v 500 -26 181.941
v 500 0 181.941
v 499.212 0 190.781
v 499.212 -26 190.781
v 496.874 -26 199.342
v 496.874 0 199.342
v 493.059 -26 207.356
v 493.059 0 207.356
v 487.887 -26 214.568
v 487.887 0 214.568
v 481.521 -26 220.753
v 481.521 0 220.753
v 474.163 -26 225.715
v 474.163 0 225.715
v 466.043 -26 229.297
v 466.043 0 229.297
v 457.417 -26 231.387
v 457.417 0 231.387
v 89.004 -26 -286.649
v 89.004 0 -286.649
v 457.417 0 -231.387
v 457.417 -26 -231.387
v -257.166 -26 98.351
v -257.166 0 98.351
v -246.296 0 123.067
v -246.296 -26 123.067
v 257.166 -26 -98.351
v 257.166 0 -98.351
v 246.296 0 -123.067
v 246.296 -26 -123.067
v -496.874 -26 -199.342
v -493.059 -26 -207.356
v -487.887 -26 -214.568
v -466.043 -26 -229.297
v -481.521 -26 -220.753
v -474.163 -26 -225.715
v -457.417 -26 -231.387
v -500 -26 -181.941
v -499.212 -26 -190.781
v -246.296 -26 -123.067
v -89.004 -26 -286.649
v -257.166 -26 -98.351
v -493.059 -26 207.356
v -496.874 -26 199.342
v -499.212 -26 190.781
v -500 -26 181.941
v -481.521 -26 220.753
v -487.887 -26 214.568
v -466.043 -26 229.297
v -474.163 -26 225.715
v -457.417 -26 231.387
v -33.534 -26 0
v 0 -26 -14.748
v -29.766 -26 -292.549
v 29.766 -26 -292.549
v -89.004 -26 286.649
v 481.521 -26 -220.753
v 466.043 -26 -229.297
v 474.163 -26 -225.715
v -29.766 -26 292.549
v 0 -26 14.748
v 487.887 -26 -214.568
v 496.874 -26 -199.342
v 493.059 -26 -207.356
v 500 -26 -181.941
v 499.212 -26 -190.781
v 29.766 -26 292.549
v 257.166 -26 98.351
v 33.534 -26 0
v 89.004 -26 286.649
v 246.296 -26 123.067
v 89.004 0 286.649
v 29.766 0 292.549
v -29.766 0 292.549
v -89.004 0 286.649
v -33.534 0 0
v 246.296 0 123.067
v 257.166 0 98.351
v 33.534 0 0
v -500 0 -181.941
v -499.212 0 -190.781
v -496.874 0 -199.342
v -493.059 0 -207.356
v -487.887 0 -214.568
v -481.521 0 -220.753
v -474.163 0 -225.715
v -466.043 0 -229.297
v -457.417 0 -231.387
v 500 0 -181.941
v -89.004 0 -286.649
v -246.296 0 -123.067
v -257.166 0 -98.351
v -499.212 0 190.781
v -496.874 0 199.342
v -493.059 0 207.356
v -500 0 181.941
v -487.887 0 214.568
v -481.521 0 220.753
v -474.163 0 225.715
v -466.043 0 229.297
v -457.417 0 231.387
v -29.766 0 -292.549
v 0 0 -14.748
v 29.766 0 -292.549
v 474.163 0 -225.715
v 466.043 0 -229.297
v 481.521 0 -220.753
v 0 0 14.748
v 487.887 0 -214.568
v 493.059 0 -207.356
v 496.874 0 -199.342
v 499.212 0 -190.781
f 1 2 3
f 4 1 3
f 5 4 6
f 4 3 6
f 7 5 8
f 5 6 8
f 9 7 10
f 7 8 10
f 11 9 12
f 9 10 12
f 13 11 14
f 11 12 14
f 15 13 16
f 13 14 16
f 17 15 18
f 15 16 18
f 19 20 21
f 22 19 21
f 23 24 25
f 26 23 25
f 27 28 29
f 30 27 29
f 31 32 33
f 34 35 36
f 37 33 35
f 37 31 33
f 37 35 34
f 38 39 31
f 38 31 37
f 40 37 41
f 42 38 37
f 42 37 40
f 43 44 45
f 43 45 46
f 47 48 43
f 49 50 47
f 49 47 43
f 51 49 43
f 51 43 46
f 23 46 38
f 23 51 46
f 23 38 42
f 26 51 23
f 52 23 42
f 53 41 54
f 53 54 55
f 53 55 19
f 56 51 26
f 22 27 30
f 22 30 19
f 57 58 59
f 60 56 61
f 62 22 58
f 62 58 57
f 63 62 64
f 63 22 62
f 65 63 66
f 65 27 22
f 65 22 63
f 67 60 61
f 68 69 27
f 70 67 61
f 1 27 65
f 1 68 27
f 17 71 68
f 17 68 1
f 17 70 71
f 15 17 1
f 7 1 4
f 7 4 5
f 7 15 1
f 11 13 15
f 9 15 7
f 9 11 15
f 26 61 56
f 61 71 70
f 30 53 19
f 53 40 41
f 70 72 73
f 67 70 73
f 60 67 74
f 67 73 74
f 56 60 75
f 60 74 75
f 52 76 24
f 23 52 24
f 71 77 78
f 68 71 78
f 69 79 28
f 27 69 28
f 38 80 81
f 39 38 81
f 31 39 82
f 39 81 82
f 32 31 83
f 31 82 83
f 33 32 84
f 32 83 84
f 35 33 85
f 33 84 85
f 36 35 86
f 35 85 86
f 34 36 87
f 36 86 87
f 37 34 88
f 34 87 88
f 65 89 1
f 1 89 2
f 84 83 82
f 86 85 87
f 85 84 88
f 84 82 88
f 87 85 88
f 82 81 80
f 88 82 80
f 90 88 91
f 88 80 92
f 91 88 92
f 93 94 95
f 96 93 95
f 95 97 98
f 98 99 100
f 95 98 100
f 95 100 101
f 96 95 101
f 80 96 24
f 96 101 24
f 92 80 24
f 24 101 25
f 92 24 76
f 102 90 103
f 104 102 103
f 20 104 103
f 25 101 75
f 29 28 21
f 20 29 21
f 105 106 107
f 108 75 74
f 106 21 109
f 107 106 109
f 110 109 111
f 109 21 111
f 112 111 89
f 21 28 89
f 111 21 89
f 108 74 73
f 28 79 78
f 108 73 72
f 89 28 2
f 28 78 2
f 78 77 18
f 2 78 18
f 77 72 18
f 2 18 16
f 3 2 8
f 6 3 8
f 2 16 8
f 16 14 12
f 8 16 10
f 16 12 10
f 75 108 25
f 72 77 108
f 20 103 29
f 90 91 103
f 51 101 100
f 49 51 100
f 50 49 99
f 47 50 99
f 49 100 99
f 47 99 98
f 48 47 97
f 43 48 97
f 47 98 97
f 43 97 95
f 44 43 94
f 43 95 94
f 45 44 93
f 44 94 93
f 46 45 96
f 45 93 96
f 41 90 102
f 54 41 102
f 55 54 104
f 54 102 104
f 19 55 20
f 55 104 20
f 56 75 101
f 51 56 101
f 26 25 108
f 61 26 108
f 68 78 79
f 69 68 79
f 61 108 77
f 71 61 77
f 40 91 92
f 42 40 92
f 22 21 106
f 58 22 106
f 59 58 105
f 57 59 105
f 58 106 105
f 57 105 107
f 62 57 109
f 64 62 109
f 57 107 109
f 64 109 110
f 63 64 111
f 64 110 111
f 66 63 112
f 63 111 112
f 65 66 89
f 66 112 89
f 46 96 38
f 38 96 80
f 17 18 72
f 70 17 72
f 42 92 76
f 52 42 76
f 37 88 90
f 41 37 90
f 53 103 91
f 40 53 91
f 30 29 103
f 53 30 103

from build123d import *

# Parameters (mm, degrees)
F1_DEPTH = 26


with BuildPart() as f1:
    # F0 (on Front) → F1 (new body)
    with BuildSketch(Plane.XZ):
        with BuildLine():
            Line((-500, 181.940629), (-500, -181.940629))
            ThreePointArc((-500, -181.940629), (-487.887011, -214.568446), (-457.417023, -231.387447))
            Line((-457.417023, -231.387447), (-89.004272, -286.649359))
            ThreePointArc((-89.004272, -286.649359), (0, -293.287548), (89.004272, -286.649359))
            Line((89.004272, -286.649359), (457.417023, -231.387447))
            ThreePointArc((457.417023, -231.387447), (487.887011, -214.568446), (500, -181.940629))
            Line((500, -181.940629), (500, 181.940629))
            ThreePointArc((500, 181.940629), (487.887011, 214.568446), (457.417023, 231.387447))
            Line((457.417023, 231.387447), (89.004272, 286.649359))
            ThreePointArc((89.004272, 286.649359), (0, 293.287548), (-89.004272, 286.649359))
            Line((-89.004272, 286.649359), (-457.417023, 231.387447))
            ThreePointArc((-457.417023, 231.387447), (-487.887011, 214.568446), (-500, 181.940629))
        make_face()
        Polygon((-246.29619, 123.066799), (0, 14.747886), (246.29619, 123.066799), (257.16581, 98.351391), (33.53383, 0), (257.16581, -98.351391), (246.29619, -123.066799), (0, -14.747886), (-246.29619, -123.066799), (-257.16581, -98.351391), (-33.53383, 0), (-257.16581, 98.351391), align=None, mode=Mode.SUBTRACT)
    extrude(amount=F1_DEPTH)


solid = f1.part
